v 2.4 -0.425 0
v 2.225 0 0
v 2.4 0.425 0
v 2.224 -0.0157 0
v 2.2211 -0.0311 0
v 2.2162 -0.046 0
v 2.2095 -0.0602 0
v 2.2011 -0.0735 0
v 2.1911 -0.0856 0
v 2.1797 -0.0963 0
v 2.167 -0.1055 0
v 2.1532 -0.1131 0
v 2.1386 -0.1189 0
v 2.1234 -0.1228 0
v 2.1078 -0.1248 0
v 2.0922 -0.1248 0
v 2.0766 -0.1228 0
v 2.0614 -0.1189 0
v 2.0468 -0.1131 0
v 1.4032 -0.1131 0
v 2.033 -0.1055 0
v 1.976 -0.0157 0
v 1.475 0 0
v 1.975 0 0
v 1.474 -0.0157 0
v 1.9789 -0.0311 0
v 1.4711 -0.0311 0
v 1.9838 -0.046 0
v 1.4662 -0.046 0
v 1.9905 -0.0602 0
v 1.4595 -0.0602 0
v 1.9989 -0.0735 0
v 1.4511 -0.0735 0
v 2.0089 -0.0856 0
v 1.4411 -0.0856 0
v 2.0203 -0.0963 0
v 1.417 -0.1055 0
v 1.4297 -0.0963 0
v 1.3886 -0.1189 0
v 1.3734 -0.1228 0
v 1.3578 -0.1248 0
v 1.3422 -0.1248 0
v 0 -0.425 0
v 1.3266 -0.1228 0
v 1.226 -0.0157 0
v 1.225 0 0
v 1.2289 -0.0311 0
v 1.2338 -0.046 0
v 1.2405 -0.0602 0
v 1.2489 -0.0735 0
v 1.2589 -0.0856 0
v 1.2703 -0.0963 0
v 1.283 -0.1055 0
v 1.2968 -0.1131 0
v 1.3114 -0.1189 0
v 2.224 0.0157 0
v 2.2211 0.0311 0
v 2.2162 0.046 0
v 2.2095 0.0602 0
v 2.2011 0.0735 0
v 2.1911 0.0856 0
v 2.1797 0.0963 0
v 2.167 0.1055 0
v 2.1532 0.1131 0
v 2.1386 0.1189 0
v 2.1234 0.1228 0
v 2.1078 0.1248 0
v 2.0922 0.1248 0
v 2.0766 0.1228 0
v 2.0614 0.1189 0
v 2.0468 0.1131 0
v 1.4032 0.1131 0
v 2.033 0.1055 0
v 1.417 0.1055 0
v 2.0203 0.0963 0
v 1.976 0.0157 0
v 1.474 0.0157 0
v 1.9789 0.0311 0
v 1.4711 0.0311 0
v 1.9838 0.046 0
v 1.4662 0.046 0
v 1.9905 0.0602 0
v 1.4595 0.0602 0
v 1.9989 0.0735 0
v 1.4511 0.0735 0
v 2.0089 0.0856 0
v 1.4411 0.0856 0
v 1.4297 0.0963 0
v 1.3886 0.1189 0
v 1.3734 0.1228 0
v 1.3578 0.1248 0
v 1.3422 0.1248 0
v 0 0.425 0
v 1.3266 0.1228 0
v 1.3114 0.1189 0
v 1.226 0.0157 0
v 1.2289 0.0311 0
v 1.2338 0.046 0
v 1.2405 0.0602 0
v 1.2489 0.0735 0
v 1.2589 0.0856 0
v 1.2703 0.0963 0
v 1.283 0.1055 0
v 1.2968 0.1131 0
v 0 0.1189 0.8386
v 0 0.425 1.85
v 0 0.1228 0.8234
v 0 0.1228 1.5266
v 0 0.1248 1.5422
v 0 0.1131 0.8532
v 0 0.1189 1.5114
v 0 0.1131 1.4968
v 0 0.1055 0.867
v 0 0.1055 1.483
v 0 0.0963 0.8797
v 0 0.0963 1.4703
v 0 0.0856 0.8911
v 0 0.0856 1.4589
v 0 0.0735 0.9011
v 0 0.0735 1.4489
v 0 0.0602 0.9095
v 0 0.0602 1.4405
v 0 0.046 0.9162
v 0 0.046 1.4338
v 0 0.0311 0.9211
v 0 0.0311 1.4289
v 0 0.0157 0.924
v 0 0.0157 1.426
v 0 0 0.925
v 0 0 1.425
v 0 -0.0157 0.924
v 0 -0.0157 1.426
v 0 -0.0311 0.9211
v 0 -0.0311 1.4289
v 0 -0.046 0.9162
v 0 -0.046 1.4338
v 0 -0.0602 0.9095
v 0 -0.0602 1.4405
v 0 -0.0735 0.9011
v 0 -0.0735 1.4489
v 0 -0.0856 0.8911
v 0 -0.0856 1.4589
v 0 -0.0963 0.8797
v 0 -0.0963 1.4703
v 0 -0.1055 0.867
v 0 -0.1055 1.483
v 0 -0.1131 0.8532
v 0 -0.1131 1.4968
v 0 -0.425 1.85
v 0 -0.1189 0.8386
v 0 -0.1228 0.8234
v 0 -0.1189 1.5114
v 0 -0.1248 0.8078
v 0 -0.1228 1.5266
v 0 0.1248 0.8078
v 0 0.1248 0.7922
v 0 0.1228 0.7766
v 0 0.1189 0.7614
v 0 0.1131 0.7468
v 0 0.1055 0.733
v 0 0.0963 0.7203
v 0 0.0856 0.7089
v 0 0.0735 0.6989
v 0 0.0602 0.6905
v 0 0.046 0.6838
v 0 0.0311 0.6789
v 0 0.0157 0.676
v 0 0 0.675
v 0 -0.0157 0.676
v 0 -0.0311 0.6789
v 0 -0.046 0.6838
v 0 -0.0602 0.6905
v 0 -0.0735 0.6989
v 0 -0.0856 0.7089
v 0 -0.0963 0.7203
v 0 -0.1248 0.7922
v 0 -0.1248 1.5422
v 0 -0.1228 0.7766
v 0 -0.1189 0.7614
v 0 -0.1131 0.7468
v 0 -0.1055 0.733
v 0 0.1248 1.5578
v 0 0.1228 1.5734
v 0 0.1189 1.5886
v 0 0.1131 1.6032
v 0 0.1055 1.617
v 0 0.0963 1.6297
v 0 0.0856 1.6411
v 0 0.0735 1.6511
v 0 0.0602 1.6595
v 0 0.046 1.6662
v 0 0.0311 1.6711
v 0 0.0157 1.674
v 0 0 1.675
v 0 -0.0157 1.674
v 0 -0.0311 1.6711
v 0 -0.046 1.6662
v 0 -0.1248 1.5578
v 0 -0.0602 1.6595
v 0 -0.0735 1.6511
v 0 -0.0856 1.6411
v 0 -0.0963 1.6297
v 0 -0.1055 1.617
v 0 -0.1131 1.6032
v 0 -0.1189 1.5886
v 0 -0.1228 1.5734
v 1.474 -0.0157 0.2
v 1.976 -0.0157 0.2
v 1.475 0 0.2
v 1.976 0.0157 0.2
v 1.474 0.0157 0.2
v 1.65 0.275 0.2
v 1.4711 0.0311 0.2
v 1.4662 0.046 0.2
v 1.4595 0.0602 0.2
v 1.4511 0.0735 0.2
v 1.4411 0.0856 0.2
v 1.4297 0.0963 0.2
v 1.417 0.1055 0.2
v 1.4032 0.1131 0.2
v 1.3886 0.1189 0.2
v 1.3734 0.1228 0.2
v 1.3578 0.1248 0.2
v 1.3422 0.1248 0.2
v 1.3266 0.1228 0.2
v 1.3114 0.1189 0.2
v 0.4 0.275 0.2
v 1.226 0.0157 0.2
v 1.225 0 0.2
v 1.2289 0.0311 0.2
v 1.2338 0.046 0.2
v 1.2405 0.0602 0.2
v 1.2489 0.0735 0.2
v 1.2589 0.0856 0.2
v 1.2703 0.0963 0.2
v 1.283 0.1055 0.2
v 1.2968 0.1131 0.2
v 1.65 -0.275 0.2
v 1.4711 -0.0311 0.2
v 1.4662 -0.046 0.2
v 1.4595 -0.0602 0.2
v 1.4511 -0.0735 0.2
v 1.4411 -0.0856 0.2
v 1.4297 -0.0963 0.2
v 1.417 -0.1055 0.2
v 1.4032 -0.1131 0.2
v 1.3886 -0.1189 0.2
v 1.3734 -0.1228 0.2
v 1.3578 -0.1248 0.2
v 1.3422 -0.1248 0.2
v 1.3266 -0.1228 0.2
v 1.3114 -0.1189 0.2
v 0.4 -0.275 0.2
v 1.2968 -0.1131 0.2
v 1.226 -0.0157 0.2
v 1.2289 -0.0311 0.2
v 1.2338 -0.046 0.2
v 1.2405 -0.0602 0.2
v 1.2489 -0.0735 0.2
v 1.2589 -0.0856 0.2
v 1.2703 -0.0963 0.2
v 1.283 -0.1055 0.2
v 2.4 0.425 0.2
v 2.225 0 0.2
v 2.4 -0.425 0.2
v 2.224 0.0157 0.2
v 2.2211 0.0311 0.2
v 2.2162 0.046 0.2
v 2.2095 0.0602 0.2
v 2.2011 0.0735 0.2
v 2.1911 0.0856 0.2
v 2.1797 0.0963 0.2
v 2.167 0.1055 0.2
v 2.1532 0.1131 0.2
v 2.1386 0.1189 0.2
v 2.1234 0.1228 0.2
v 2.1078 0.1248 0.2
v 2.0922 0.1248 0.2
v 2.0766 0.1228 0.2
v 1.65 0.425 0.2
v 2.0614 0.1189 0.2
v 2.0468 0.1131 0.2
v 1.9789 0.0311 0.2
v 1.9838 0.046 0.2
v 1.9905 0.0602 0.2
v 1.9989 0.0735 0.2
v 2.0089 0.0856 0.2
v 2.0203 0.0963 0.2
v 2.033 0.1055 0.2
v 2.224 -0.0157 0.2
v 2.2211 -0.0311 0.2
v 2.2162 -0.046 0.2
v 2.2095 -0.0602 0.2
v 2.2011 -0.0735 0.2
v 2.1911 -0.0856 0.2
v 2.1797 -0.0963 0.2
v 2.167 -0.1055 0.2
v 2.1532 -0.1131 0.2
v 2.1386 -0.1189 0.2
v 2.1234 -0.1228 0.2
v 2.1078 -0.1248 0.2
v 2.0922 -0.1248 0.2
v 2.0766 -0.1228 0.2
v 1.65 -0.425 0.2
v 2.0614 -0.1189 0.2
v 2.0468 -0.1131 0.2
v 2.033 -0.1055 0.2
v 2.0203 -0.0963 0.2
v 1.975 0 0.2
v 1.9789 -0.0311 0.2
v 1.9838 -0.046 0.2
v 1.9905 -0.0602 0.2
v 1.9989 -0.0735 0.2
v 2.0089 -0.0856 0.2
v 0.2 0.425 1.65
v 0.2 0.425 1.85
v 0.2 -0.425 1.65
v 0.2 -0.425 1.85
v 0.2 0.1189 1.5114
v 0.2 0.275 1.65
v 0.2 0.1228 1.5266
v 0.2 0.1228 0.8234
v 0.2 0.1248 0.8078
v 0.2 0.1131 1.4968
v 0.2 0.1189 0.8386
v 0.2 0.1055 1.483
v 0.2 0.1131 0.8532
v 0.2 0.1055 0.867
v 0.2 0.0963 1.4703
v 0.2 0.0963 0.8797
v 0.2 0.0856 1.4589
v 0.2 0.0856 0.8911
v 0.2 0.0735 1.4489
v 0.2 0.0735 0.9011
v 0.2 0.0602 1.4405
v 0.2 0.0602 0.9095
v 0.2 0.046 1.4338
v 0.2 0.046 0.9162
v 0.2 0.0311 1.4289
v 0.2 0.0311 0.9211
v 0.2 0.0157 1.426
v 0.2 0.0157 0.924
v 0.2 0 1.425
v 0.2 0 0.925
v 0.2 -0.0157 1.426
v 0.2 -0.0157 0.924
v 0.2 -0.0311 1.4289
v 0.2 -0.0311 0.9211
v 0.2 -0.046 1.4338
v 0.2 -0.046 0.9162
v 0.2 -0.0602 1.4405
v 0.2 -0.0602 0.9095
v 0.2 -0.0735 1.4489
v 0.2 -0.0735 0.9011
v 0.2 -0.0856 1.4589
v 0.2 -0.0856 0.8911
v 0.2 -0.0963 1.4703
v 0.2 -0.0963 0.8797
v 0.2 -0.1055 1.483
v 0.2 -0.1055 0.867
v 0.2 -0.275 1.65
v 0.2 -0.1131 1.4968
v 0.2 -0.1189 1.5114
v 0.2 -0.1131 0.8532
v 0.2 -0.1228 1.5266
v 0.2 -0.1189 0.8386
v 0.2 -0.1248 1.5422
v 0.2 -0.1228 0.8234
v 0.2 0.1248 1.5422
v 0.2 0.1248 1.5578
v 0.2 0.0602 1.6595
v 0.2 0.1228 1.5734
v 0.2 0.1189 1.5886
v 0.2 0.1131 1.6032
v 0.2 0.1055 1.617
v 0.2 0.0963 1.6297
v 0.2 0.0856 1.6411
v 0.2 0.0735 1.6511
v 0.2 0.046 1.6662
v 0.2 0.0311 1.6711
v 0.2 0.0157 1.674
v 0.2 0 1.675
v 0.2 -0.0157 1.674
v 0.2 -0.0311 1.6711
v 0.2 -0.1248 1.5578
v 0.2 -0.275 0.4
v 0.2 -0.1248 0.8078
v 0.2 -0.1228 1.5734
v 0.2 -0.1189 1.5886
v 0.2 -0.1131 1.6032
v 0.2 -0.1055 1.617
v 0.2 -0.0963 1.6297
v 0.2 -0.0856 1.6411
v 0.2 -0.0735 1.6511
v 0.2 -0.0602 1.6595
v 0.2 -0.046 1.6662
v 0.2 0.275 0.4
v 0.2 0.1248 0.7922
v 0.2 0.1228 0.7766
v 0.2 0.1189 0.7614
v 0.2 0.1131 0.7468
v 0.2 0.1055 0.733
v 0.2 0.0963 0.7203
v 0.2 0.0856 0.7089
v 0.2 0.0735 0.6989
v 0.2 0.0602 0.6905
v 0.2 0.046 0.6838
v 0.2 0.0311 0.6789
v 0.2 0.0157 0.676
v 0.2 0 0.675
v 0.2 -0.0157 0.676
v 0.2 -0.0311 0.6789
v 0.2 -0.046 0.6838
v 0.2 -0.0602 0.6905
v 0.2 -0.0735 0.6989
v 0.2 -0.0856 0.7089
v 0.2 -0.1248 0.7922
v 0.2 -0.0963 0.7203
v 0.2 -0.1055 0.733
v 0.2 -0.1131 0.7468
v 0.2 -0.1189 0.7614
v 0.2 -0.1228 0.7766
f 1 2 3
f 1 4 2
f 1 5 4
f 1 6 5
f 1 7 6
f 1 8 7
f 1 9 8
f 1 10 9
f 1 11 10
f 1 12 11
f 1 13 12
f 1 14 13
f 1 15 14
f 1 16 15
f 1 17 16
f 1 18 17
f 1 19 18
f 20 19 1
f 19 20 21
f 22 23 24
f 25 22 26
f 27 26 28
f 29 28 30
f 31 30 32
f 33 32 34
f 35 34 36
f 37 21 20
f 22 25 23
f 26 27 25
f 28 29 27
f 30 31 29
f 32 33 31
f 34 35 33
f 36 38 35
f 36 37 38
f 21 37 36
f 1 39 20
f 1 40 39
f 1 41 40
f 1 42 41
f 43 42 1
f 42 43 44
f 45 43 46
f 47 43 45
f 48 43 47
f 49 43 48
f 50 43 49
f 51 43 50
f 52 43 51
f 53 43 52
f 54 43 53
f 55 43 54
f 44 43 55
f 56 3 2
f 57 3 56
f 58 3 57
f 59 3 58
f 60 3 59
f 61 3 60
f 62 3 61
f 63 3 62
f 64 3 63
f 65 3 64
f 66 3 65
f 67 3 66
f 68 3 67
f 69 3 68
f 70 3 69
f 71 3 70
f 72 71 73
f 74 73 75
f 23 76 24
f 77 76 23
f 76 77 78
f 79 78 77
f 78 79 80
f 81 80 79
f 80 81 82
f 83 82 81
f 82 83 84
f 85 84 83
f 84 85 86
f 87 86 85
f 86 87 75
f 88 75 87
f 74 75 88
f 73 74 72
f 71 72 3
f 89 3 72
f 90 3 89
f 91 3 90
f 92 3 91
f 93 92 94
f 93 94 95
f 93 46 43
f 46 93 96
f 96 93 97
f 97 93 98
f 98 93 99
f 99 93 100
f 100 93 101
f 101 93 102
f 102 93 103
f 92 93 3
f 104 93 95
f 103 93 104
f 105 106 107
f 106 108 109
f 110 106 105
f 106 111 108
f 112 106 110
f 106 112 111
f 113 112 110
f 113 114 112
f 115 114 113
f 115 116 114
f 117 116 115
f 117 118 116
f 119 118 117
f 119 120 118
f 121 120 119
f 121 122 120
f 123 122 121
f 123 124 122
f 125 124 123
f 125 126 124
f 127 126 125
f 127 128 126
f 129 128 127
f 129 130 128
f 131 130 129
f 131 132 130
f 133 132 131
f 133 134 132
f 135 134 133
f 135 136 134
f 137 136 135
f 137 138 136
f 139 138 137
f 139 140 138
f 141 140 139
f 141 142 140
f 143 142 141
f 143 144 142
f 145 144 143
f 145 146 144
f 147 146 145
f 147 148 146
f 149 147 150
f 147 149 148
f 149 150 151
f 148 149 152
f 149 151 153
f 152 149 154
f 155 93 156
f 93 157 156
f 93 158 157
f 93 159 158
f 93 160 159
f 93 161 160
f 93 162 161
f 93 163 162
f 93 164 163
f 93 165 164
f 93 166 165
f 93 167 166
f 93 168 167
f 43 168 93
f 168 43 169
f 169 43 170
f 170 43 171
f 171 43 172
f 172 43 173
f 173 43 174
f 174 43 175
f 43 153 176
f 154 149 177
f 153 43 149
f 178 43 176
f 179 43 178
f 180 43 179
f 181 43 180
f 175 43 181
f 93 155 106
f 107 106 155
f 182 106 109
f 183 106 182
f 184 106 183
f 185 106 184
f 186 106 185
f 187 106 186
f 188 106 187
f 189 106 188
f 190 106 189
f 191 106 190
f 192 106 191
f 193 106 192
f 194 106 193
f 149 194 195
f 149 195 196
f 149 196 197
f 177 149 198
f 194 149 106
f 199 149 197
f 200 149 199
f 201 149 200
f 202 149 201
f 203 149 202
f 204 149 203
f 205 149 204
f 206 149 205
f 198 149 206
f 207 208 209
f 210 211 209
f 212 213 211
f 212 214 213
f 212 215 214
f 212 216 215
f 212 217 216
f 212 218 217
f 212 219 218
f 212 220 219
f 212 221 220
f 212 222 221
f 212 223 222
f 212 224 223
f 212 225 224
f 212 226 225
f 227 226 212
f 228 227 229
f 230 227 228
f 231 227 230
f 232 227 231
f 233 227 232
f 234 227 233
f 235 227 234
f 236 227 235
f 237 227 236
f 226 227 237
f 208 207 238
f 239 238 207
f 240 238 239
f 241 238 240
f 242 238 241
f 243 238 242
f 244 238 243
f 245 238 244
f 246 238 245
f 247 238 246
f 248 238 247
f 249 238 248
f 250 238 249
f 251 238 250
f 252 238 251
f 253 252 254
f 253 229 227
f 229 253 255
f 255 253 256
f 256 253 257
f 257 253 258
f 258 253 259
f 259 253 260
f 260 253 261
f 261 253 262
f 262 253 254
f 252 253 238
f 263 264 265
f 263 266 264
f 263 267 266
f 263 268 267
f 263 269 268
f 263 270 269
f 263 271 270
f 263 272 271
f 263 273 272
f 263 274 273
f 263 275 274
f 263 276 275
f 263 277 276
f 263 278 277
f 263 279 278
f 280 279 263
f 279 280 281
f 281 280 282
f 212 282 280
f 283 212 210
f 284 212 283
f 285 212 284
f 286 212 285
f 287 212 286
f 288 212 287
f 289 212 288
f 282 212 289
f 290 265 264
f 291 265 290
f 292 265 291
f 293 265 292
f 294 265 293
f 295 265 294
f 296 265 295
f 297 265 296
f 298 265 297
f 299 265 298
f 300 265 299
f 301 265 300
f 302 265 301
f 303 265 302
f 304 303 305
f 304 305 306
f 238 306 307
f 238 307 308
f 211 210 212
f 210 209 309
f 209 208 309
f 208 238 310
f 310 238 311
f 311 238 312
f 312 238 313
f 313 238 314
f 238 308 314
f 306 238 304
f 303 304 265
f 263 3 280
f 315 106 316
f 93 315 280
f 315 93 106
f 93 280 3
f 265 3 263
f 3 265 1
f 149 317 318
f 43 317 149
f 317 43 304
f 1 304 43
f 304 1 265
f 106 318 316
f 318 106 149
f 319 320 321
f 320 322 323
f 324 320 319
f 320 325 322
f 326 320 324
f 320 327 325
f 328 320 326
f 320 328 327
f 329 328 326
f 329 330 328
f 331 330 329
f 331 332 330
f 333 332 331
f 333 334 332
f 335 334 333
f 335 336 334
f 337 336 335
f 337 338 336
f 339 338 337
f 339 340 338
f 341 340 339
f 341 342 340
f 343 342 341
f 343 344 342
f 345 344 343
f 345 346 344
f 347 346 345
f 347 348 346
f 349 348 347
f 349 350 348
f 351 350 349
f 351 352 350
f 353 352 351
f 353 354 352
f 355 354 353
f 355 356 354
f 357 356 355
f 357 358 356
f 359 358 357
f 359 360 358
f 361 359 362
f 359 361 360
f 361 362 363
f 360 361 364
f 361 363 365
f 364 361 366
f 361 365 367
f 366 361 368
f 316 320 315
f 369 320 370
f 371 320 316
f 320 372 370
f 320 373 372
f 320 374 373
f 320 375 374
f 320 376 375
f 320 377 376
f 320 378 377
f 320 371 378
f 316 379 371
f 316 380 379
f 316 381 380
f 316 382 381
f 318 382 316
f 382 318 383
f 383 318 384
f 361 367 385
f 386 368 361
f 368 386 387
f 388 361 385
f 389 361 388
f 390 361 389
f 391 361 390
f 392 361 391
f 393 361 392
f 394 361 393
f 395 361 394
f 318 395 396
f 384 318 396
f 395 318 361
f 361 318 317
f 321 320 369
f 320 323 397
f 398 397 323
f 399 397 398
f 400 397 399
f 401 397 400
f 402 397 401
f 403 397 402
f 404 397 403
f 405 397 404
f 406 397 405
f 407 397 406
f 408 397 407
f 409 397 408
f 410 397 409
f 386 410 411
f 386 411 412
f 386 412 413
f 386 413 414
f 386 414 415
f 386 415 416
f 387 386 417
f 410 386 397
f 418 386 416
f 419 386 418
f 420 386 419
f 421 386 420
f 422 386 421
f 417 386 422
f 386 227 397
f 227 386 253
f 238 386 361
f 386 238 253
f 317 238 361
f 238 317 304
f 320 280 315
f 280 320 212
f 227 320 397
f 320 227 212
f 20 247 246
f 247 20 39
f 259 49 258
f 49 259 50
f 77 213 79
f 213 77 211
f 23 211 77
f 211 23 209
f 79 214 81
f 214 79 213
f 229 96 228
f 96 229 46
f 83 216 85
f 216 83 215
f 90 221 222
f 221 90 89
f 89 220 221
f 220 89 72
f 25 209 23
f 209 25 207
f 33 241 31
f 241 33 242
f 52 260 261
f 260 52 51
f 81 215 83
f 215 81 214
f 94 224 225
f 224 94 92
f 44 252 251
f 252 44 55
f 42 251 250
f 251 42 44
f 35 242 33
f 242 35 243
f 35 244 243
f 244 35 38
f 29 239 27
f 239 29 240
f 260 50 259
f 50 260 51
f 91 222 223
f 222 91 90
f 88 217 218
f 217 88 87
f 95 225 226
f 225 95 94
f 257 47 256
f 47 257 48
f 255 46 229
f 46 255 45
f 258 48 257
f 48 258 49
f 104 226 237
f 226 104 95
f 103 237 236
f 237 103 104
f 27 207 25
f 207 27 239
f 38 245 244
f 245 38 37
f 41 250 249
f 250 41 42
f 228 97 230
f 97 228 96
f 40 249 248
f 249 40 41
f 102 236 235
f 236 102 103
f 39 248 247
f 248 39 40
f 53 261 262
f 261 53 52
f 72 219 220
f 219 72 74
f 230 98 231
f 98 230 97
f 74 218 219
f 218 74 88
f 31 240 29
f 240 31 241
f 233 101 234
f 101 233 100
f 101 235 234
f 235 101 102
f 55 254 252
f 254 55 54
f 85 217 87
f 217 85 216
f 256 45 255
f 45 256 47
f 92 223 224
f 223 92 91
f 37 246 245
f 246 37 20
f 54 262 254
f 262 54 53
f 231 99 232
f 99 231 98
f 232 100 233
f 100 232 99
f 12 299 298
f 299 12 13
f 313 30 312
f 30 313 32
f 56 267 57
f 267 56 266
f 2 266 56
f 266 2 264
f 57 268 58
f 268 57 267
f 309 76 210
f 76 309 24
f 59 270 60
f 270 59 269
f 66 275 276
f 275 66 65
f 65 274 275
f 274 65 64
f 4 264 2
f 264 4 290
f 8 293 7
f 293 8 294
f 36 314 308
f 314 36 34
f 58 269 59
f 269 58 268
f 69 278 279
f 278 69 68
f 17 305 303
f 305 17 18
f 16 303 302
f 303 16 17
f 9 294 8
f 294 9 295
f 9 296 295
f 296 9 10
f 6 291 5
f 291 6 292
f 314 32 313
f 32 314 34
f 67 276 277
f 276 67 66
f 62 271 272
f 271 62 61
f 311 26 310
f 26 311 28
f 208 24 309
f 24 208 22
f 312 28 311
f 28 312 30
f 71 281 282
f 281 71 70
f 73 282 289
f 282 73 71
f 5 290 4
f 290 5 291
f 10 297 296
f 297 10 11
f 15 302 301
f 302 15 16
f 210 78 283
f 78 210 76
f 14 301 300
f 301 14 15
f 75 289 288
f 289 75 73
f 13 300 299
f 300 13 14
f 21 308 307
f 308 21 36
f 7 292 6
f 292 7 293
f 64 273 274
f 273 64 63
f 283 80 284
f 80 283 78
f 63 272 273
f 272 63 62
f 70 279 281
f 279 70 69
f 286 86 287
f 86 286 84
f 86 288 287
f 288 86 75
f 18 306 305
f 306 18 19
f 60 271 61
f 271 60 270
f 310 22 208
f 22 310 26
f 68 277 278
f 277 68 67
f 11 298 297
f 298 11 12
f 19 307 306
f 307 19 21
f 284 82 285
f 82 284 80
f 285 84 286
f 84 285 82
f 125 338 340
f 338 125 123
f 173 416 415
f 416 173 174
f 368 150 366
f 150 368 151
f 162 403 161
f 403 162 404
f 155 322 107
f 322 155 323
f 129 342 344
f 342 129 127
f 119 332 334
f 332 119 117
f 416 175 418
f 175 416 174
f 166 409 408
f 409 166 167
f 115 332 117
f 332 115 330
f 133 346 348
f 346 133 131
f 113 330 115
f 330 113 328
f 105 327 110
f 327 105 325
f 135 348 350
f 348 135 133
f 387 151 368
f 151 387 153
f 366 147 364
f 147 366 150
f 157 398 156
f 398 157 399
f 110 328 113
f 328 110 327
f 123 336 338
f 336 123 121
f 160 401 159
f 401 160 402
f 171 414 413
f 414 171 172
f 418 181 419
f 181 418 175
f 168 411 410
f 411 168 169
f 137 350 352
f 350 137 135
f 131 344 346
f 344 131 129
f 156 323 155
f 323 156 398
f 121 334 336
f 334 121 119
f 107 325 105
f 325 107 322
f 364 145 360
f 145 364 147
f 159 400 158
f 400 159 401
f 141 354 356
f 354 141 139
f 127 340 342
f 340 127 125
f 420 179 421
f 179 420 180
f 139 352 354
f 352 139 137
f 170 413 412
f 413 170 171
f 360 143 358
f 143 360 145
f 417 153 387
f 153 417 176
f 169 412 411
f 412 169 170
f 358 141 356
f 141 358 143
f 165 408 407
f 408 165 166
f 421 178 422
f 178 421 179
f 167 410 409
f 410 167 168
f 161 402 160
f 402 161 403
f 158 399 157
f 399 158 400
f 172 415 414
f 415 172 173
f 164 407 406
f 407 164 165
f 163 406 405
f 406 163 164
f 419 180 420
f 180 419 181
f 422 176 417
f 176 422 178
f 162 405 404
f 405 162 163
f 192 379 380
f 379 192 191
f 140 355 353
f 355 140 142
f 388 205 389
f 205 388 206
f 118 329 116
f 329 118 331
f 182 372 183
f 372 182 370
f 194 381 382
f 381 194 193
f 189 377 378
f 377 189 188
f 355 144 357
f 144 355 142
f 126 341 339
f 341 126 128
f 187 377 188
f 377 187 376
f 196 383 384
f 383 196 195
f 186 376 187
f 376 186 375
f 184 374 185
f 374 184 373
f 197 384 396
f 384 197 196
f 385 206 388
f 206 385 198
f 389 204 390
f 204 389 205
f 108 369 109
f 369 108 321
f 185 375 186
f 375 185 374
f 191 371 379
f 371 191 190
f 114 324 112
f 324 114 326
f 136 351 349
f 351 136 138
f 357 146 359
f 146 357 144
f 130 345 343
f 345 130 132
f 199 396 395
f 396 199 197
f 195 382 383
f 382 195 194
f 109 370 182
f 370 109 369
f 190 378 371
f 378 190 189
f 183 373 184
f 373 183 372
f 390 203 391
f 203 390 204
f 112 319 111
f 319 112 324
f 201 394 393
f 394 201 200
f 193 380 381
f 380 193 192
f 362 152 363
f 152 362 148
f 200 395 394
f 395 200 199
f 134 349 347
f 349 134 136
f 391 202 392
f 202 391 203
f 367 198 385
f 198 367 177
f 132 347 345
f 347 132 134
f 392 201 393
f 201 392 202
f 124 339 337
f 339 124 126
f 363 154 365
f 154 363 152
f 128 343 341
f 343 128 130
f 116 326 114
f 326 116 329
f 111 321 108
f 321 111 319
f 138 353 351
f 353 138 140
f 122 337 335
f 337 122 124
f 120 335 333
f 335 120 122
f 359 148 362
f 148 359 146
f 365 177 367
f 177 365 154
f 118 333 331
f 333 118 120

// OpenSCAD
// units in inches
T_bracket = .2;
T_hole = .5;
T_corner = .6;
T_shell = .15;
L1 = 2.4;
L2 = 1.85;
Hu1 = .8;
Hu2 = 1.55;
Hl1 = 1.35;
Hl2 = 2.1;
W = .85;
D_hole = .25;


module prism(l, w, h){
       polyhedron(
               points=[[0,0,0], [l,0,0], [l,w,0], [0,w,0], [0,w,h], [l,w,h]],
               faces=[[0,1,2,3],[5,4,3,2],[0,4,5,1],[0,3,4],[5,2,1]]
               );
}
difference() {
    union() {
      translate([L1/2,0,0])
        linear_extrude(height = T_bracket)
                square([L1, W], center = true);
      
      translate([T_bracket/2,0,0])
        linear_extrude(height = L2)
                square([T_bracket, W], center = true);
        
      translate([T_corner,-W/2,0 ])
        rotate([0,0,90])
            prism(W, T_corner, T_corner);
        
      translate([L2,-W/2,0 ])
        rotate([0,0,90])
            prism(T_shell, L2, L2);
        
      translate([L2,W/2-T_shell,0 ])
        rotate([0,0,90])
            prism(T_shell, L2, L2);
    };
    
    union() {
        translate([Hl1, 0, 0])
            cylinder(h=T_hole,d=D_hole,center=true,$fn=50);
        
        translate([Hl2, 0, 0])
            cylinder(h=T_hole,d=D_hole,center=true,$fn=50);

        rotate([0,270,0])
            translate([Hu1, 0, 0])
                cylinder(h=T_hole,d=D_hole,center=true,$fn=50);
        
        rotate([0,270,0])
            translate([Hu2, 0, 0])
                cylinder(h=T_hole,d=D_hole,center=true,$fn=50);
    };
}
